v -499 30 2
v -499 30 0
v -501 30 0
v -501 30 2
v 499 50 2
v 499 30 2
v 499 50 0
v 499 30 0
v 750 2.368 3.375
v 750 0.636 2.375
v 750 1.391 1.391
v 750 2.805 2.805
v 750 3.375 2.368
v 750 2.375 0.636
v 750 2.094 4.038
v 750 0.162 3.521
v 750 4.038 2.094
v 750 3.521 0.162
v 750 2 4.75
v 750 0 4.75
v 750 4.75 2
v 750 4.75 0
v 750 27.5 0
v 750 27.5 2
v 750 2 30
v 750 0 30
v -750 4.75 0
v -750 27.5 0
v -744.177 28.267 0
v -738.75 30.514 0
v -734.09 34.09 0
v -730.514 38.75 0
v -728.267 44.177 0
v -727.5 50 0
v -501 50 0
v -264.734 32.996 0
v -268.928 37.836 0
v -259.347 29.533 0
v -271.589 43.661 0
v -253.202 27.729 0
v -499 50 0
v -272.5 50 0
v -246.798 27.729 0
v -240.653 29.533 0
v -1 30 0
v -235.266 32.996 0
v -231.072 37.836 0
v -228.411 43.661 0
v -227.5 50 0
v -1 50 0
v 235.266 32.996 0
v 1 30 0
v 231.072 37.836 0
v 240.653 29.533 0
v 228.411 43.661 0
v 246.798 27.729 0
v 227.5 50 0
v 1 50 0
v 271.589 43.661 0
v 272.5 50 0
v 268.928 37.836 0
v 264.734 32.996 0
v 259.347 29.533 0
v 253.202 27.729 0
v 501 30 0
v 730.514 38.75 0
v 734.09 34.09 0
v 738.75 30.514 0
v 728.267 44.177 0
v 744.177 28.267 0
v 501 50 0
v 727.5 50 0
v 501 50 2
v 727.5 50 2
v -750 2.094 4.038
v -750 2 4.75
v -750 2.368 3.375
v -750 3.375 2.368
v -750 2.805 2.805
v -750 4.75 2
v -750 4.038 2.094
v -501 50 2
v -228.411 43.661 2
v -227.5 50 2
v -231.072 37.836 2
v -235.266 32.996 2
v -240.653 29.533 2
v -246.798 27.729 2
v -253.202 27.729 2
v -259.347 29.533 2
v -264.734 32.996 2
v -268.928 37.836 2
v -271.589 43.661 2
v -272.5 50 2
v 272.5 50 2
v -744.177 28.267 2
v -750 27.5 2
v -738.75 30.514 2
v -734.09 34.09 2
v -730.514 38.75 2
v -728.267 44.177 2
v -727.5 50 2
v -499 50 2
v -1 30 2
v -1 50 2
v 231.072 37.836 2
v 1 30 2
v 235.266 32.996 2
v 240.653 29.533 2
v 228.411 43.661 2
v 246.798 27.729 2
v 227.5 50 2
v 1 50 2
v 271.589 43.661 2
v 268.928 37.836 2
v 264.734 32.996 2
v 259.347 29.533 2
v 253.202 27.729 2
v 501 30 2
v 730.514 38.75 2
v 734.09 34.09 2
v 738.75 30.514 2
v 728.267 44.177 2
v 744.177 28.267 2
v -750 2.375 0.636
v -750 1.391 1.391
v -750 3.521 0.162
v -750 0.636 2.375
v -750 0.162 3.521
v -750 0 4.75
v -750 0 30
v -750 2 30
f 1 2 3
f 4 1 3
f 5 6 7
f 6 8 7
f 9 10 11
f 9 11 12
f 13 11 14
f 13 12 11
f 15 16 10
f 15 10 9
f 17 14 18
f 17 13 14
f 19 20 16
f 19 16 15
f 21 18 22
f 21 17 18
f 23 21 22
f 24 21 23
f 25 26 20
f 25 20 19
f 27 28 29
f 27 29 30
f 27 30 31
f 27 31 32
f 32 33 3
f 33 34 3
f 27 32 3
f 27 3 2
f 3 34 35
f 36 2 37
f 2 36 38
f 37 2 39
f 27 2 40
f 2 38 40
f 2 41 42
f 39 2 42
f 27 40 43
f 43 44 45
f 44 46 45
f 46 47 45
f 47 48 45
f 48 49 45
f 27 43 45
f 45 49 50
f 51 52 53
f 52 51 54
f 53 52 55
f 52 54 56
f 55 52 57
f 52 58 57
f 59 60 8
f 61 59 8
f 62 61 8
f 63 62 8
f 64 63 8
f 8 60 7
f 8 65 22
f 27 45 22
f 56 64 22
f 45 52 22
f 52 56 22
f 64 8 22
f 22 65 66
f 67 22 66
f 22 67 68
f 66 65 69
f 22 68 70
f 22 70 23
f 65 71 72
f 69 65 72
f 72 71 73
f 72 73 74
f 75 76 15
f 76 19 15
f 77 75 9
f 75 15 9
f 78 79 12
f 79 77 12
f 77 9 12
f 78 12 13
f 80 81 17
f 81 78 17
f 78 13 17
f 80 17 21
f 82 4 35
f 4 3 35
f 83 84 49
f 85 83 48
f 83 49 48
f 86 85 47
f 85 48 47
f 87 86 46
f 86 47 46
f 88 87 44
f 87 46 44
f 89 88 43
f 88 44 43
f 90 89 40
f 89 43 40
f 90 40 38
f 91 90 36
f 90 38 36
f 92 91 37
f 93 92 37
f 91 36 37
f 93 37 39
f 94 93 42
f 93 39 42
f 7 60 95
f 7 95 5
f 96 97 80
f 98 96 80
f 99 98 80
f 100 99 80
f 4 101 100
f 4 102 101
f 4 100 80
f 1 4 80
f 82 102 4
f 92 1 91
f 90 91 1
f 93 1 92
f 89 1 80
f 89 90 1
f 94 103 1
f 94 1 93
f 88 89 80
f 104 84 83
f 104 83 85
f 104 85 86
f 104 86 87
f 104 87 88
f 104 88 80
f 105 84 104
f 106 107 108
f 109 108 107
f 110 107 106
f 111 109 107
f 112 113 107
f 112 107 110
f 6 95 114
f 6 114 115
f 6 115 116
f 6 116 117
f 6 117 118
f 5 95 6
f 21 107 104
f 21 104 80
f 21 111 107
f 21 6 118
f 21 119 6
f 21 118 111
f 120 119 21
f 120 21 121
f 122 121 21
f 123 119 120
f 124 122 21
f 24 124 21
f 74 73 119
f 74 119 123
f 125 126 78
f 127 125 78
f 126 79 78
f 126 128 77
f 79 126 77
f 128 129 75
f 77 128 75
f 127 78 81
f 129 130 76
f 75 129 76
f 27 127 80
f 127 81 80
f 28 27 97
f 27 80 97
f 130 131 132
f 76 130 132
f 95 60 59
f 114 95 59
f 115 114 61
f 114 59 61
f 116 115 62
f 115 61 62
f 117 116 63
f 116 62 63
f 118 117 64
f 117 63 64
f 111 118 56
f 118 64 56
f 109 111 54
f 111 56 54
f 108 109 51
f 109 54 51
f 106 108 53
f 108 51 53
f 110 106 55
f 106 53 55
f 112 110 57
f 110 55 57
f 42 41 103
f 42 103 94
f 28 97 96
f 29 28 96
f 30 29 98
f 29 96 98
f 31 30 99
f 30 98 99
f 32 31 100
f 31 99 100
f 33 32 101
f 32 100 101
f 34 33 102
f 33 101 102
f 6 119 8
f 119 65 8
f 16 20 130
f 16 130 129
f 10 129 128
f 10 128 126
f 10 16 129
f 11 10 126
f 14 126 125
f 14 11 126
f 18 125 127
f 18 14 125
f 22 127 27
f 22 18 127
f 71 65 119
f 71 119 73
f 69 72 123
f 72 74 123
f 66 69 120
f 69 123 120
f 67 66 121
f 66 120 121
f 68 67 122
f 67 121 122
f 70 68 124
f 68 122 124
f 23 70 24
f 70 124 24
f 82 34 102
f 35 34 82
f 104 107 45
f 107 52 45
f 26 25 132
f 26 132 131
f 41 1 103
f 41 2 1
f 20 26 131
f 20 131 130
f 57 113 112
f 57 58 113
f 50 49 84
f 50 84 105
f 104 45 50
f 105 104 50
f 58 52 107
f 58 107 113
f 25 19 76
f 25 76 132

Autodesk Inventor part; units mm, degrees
ref_plane "YZ Plane" through (0, 0, 0) normal (1, 0, 0) x (0, 1, 0)
ref_plane "XZ Plane" through (0, 0, 0) normal (0, 1, 0) x (-1, 0, 0)
ref_plane "XY Plane" through (0, 0, 0) normal (0, 0, 1) x (1, 0, 0)
sketch "Sketch1" plane through (0, 0, 0) normal (0, 0, 1) x (1, 0, 0)
  line L0 (-750, 50) -> (750, 50)
  line L1 (750, 50) -> (750, 0)
  line L2 (750, 0) -> (-750, 0)
  line L3 (-750, 0) -> (-750, 50)
  point P0 (0, 0)
  point P1 (0, 0)
  dimension "d0" = 1500
  dimension "d1" = 50
extrude "Plate1" add sketch "Sketch1" along normal blind 2
sketch "Sketch2" plane through (750, 2, 0) normal (0, -1, 0) x (1, 0, 0)
  line L0 (-1500, 0) -> (0, 0)
  line L1 (0, 0) -> (0, 30)
  line L2 (0, 30) -> (-1500, 30)
  line L3 (-1500, 30) -> (-1500, 0)
edge flange "Flange1" height 30 angle 90 thickness 2 bend radius 2.75 thickness toward (0, -1, 0) relief round relief width 2 relief depth 1 edges at (0, 0, 2) wall of the first edge with corners at (-750, 2, 0) (750, 2, 0) (750, 2, 30) (-750, 2, 30)
bend "Bend1"
corner "Corner1"
sketch "Sketch5" plane through (0, 0, 0) normal (0, 0, -1) x (-1, 0, 0)
  line L0 (750, 50) -> (-750, 50) projected
  line L1 (-1, 30) -> (-1, 50)
  line L2 (750, 0) -> (-750, 0) projected
  line L3 (-1, 30) -> (1, 30)
  line L4 (1, 30) -> (1, 50)
  point P0 (0, 0)
  point P1 (0, 30)
  point P2 (0, 0)
  dimension "d27" = 2
  dimension "d28" = 30
extrude "Extrusion1" cut sketch "Sketch5" against normal through all
pattern_linear "Rectangular Pattern1" count 3 spacing 500 along (1, 0, 0) of "Extrusion1" first direction both ways yes
sketch "Sketch6" plane through (0, 0, 0) normal (0, 0, -1) x (-1, 0, 0)
  line L0 (-750, 50) -> (-750, 4.75) projected
  circle A0 centre (-750, 50) radius 22.5
  line L1 (-750, 50) -> (750, 50) projected
  line L2 (-1, 50) -> (-1, 30) projected
  line L3 (-499, 50) -> (-499, 30) projected
  line L4 (-1, 30) -> (-499, 30) construction
  circle A1 centre (-250, 50) radius 22.5
  point P0 (0, 0)
  point P1 (-727.5, 50)
  point P2 (-750, 27.5)
  point P3 (-250, 30)
  dimension "d24" = 45
extrude "Extrusion2" cut sketch "Sketch6" along normal mid plane 30 contours L1 A0 L0 | A1 L1 | L1 A1 picked at (-748.3311, 35.188)
mirror "Mirror1" about plane through (0, 0, 0) normal (1, 0, 0) of "Extrusion2"
sketch "Sketch7" plane through (0, 0, 2) normal (0, 0, 1) x (1, 0, 0)
  line L0 (494, 45) -> (494, 33) construction
  line L1 (494, 33) -> (294, 33) construction
  line L2 (294, 33) -> (294, 45) construction
  line L3 (294, 45) -> (494, 45) construction
  line L4 (272.5, 50) -> (499, 50) projected
  point P0 (0, 0)
  dimension "d29" = 200
  dimension "d30" = 12
  dimension "d31" = 5
  dimension "d32" = 5
mark "Mark1"
equation "\"d28\" = Стрингер_глубина_паза"
equation "\"d1\" = Стрингер_7"
equation "\"d27\" = d18"
equation "\"d2\" = Thickness"
equation "\"d3\" = BendReliefWidth"
equation "\"d4\" = BendReliefDepth"
equation "\"d5\" = MinimumRemnant"
equation "\"d6\" = TransitionRadius"
equation "\"d9\" = BendRadius"
equation "\"d10\" = CornerReliefSize"
equation "\"d11\" = GapSize"
equation "\"d12\" = JacobiRadiusSize"
equation "\"GapSize\" = Thickness"
equation "\"MinimumRemnant\" = 2 * Thickness"
equation "\"BendReliefDepth\" = 0.5 * Thickness"
equation "\"BendReliefWidth\" = Thickness"
equation "\"CornerReliefSize\" = 4 * Thickness"
equation "\"JacobiRadiusSize\" = BendRadius"
equation "\"TransitionRadius\" = BendRadius"
equation "\"d18\" = Thickness"
equation "\"Стрингер_7\" = 50"
equation "\"Thickness\" = 2"
equation "\"BendRadius\" = 2.75"
equation "\"Стрингер_глубина_паза\" = 30"
properties part number "MSC 057 stringer belly" material "Stainless Steel"
